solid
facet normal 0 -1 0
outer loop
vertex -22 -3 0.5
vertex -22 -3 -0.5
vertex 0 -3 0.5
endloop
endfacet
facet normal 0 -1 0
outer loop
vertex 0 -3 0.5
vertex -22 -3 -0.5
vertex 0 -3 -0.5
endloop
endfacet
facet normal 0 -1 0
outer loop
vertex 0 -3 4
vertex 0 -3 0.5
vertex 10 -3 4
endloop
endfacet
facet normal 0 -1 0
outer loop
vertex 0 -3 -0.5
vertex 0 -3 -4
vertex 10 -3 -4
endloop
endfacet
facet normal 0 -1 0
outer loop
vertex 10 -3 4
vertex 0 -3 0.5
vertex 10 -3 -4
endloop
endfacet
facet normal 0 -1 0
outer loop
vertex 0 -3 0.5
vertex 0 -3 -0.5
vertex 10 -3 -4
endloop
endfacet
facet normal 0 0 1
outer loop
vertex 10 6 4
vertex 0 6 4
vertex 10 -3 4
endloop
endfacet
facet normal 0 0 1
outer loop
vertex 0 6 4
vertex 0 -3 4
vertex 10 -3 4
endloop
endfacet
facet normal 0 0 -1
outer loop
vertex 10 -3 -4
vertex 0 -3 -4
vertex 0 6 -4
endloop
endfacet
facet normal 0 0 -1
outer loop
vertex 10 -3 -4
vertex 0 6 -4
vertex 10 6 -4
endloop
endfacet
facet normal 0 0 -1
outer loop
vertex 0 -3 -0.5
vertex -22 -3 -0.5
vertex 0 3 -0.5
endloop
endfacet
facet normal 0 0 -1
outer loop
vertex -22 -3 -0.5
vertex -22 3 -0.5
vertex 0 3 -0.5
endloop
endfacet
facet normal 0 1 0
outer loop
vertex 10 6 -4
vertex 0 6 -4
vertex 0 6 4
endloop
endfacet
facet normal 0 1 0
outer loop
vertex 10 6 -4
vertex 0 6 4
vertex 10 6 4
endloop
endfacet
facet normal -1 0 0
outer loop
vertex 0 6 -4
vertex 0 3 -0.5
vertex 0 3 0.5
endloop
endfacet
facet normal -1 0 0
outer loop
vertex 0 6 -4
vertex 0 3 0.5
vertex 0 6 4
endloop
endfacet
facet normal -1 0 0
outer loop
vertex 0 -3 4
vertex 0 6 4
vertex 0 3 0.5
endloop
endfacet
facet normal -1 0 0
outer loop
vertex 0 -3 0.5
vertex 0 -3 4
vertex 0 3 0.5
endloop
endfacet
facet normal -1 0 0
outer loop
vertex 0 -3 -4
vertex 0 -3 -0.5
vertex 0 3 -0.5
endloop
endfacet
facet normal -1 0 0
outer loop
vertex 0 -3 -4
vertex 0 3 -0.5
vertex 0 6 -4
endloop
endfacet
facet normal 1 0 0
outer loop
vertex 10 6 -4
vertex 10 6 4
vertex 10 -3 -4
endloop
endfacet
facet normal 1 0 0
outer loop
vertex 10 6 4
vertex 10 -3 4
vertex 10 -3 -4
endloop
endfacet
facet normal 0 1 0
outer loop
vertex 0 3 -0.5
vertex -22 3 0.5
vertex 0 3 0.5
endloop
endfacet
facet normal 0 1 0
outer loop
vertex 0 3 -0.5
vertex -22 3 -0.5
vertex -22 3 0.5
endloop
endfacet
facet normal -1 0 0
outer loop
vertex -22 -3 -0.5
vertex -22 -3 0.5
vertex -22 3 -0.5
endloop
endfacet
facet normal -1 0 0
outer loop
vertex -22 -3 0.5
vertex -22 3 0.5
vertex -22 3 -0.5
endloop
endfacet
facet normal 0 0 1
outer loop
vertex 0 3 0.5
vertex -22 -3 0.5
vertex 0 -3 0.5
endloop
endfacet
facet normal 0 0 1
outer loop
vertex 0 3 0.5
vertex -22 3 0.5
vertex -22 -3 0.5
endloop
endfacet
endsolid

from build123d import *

# Parameters (mm, degrees)
SKETCH1_W           = 10
SKETCH1_H           = 8
SKETCH1_W_2         = 22
SKETCH1_H_2         = 1
BOSS_EXTRUDE1_DEPTH = 3
SKETCH2_W           = 10
SKETCH2_H           = 8
BOSS_EXTRUDE2_DEPTH = 3


with BuildPart() as part:
    # Sketch1 → Boss-Extrude1 (new, symmetric)
    with BuildSketch(Plane(origin=(0, 0, 0), x_dir=(1, 0, 0), z_dir=(0, 1, 0))):
        with Locations((5, 0)):
            Rectangle(SKETCH1_W, SKETCH1_H)
        with Locations((-11, 0)):
            Rectangle(SKETCH1_W_2, SKETCH1_H_2)
    extrude(amount=BOSS_EXTRUDE1_DEPTH, both=True)

    # Sketch2 → Boss-Extrude2 (add)
    with BuildSketch(Plane(origin=(0, 3, 0), x_dir=(1, 0, 0), z_dir=(0, 1, 0))):
        with Locations((5, 0)):
            Rectangle(SKETCH2_W, SKETCH2_H)
    extrude(amount=BOSS_EXTRUDE2_DEPTH)


solid = part.part
